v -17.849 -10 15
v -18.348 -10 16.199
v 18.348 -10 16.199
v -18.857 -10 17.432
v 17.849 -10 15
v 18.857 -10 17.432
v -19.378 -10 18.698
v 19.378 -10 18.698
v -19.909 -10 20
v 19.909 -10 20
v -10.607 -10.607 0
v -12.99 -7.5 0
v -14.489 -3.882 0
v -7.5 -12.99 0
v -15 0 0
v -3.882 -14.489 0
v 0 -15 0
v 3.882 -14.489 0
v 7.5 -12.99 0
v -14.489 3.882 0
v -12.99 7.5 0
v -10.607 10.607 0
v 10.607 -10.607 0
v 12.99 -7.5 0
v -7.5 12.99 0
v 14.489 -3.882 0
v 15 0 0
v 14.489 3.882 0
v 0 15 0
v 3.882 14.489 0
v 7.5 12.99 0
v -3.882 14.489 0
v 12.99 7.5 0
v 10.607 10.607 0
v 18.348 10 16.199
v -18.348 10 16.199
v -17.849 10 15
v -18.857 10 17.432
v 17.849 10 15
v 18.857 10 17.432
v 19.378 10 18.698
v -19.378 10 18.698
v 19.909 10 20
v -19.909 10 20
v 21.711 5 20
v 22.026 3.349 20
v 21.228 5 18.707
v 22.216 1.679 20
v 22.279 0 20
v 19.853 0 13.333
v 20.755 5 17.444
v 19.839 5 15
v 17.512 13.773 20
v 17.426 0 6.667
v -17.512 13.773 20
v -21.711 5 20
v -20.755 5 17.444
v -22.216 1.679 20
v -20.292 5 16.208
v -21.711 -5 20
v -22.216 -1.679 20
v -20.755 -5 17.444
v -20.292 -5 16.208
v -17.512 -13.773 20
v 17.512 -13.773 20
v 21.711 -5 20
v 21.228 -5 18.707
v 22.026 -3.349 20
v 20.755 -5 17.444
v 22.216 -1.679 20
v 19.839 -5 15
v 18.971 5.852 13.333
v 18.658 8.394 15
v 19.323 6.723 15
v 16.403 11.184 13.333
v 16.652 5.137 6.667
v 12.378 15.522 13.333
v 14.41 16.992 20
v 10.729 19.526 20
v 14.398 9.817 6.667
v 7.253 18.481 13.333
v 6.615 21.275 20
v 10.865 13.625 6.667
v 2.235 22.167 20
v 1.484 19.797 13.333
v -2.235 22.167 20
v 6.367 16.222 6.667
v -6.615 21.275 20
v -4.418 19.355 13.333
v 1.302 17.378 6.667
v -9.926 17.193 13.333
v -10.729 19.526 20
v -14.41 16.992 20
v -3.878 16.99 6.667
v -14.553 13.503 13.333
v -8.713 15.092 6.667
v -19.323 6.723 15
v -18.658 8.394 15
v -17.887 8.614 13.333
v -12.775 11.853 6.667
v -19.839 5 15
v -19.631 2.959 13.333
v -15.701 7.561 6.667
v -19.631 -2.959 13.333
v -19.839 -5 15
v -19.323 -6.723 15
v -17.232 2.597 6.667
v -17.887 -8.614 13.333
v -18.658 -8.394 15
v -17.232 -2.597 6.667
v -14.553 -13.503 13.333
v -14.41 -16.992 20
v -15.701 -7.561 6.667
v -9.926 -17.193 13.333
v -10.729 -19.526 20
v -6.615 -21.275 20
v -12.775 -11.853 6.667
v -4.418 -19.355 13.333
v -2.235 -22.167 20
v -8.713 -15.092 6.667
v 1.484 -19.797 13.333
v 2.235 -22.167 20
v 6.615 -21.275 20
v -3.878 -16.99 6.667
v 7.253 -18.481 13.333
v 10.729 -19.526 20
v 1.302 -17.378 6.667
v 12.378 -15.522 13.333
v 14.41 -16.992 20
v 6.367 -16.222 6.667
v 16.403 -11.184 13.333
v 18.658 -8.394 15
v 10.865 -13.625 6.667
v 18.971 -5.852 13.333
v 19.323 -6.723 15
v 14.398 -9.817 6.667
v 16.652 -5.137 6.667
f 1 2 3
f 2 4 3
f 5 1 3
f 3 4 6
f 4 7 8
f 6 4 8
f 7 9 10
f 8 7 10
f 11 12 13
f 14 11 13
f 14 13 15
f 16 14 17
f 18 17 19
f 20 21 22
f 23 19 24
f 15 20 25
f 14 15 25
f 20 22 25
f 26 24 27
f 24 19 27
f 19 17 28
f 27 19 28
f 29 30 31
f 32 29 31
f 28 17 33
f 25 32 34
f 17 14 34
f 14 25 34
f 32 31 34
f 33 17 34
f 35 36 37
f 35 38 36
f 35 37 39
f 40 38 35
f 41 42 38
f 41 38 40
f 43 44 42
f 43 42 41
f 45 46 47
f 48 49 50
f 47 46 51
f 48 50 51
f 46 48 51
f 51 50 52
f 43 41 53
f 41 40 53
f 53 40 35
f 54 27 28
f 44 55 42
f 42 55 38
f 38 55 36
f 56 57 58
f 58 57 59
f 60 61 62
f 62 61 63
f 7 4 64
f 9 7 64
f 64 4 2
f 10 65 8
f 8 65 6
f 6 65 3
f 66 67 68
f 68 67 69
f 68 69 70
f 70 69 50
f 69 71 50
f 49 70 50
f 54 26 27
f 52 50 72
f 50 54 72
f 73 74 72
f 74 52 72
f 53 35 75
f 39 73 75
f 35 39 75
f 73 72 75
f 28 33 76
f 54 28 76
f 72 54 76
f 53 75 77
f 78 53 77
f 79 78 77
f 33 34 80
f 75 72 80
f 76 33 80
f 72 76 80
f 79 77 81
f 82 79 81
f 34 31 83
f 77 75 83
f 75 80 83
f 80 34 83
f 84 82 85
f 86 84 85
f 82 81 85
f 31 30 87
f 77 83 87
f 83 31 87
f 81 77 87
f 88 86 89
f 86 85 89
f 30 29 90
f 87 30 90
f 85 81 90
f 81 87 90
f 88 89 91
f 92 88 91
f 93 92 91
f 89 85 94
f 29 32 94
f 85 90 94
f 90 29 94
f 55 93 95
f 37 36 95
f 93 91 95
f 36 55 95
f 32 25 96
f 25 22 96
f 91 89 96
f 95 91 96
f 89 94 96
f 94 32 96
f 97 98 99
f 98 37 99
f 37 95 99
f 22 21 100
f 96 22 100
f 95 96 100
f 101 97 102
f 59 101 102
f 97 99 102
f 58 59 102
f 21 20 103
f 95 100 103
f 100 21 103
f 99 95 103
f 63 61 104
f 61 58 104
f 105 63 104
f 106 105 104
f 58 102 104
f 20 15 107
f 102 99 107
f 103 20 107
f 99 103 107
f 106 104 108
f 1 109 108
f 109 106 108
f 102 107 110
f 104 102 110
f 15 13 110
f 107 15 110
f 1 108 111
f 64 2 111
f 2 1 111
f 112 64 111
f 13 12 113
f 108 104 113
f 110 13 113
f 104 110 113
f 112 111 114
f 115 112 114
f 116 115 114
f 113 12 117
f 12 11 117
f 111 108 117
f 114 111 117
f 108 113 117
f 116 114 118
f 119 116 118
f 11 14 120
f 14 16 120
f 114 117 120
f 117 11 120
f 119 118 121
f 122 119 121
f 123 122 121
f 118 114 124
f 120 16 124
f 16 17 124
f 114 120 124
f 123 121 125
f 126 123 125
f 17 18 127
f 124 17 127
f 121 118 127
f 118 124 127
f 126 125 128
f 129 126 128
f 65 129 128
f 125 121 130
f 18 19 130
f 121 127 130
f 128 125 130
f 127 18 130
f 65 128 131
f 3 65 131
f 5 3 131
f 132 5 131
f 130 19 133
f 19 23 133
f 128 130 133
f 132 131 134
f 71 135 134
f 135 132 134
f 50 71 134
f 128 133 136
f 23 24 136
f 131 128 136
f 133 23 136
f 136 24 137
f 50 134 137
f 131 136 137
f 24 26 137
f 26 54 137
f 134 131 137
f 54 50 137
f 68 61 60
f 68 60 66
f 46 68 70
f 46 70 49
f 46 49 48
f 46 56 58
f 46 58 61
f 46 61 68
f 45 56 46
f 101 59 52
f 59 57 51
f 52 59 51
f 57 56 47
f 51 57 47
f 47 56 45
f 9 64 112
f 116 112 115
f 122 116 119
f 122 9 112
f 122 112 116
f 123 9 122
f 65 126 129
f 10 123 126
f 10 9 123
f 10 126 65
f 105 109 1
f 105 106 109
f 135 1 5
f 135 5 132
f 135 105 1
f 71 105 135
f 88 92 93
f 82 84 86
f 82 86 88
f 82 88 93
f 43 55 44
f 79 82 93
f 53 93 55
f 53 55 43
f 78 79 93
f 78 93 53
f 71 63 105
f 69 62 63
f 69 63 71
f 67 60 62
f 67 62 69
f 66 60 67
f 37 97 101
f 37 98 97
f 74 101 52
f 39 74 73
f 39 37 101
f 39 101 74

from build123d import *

# Parameters (mm, degrees)
ESQUISSE1_R             = 15
BOSS_EXTRU_1_DEPTH      = 20
BOSS_EXTRU_1_DRAFT      = -20
ESQUISSE2_W             = 49.259331118
ESQUISSE2_H             = 5
ENL_V_MAT_EXTRU_1_DEPTH = 5


with BuildPart() as part:
    # Esquisse1 → Boss.-Extru.1 (with draft: the straight prism first)
    with BuildSketch(Plane.XY):
        Circle(ESQUISSE1_R)
    extrude(amount=BOSS_EXTRU_1_DEPTH)
    # Boss.-Extru.1: the draft: its side faces are tilted about the plane it starts from
    boss_extru_1_sides = [part.faces().sort_by_distance(p)[0] for p in [
        (-15, 0, 10),
    ]]
    draft(boss_extru_1_sides, Plane.XY, BOSS_EXTRU_1_DRAFT)

    # Esquisse2 → Enlèv. mat.-Extru.1 (cut)
    with BuildSketch(Plane.XY.offset(20)):
        with Locations((0, -7.5)):
            Rectangle(ESQUISSE2_W, ESQUISSE2_H)
        with Locations((0, 7.5)):
            Rectangle(ESQUISSE2_W, ESQUISSE2_H)
    extrude(amount=-ENL_V_MAT_EXTRU_1_DEPTH, mode=Mode.SUBTRACT)


solid = part.part
